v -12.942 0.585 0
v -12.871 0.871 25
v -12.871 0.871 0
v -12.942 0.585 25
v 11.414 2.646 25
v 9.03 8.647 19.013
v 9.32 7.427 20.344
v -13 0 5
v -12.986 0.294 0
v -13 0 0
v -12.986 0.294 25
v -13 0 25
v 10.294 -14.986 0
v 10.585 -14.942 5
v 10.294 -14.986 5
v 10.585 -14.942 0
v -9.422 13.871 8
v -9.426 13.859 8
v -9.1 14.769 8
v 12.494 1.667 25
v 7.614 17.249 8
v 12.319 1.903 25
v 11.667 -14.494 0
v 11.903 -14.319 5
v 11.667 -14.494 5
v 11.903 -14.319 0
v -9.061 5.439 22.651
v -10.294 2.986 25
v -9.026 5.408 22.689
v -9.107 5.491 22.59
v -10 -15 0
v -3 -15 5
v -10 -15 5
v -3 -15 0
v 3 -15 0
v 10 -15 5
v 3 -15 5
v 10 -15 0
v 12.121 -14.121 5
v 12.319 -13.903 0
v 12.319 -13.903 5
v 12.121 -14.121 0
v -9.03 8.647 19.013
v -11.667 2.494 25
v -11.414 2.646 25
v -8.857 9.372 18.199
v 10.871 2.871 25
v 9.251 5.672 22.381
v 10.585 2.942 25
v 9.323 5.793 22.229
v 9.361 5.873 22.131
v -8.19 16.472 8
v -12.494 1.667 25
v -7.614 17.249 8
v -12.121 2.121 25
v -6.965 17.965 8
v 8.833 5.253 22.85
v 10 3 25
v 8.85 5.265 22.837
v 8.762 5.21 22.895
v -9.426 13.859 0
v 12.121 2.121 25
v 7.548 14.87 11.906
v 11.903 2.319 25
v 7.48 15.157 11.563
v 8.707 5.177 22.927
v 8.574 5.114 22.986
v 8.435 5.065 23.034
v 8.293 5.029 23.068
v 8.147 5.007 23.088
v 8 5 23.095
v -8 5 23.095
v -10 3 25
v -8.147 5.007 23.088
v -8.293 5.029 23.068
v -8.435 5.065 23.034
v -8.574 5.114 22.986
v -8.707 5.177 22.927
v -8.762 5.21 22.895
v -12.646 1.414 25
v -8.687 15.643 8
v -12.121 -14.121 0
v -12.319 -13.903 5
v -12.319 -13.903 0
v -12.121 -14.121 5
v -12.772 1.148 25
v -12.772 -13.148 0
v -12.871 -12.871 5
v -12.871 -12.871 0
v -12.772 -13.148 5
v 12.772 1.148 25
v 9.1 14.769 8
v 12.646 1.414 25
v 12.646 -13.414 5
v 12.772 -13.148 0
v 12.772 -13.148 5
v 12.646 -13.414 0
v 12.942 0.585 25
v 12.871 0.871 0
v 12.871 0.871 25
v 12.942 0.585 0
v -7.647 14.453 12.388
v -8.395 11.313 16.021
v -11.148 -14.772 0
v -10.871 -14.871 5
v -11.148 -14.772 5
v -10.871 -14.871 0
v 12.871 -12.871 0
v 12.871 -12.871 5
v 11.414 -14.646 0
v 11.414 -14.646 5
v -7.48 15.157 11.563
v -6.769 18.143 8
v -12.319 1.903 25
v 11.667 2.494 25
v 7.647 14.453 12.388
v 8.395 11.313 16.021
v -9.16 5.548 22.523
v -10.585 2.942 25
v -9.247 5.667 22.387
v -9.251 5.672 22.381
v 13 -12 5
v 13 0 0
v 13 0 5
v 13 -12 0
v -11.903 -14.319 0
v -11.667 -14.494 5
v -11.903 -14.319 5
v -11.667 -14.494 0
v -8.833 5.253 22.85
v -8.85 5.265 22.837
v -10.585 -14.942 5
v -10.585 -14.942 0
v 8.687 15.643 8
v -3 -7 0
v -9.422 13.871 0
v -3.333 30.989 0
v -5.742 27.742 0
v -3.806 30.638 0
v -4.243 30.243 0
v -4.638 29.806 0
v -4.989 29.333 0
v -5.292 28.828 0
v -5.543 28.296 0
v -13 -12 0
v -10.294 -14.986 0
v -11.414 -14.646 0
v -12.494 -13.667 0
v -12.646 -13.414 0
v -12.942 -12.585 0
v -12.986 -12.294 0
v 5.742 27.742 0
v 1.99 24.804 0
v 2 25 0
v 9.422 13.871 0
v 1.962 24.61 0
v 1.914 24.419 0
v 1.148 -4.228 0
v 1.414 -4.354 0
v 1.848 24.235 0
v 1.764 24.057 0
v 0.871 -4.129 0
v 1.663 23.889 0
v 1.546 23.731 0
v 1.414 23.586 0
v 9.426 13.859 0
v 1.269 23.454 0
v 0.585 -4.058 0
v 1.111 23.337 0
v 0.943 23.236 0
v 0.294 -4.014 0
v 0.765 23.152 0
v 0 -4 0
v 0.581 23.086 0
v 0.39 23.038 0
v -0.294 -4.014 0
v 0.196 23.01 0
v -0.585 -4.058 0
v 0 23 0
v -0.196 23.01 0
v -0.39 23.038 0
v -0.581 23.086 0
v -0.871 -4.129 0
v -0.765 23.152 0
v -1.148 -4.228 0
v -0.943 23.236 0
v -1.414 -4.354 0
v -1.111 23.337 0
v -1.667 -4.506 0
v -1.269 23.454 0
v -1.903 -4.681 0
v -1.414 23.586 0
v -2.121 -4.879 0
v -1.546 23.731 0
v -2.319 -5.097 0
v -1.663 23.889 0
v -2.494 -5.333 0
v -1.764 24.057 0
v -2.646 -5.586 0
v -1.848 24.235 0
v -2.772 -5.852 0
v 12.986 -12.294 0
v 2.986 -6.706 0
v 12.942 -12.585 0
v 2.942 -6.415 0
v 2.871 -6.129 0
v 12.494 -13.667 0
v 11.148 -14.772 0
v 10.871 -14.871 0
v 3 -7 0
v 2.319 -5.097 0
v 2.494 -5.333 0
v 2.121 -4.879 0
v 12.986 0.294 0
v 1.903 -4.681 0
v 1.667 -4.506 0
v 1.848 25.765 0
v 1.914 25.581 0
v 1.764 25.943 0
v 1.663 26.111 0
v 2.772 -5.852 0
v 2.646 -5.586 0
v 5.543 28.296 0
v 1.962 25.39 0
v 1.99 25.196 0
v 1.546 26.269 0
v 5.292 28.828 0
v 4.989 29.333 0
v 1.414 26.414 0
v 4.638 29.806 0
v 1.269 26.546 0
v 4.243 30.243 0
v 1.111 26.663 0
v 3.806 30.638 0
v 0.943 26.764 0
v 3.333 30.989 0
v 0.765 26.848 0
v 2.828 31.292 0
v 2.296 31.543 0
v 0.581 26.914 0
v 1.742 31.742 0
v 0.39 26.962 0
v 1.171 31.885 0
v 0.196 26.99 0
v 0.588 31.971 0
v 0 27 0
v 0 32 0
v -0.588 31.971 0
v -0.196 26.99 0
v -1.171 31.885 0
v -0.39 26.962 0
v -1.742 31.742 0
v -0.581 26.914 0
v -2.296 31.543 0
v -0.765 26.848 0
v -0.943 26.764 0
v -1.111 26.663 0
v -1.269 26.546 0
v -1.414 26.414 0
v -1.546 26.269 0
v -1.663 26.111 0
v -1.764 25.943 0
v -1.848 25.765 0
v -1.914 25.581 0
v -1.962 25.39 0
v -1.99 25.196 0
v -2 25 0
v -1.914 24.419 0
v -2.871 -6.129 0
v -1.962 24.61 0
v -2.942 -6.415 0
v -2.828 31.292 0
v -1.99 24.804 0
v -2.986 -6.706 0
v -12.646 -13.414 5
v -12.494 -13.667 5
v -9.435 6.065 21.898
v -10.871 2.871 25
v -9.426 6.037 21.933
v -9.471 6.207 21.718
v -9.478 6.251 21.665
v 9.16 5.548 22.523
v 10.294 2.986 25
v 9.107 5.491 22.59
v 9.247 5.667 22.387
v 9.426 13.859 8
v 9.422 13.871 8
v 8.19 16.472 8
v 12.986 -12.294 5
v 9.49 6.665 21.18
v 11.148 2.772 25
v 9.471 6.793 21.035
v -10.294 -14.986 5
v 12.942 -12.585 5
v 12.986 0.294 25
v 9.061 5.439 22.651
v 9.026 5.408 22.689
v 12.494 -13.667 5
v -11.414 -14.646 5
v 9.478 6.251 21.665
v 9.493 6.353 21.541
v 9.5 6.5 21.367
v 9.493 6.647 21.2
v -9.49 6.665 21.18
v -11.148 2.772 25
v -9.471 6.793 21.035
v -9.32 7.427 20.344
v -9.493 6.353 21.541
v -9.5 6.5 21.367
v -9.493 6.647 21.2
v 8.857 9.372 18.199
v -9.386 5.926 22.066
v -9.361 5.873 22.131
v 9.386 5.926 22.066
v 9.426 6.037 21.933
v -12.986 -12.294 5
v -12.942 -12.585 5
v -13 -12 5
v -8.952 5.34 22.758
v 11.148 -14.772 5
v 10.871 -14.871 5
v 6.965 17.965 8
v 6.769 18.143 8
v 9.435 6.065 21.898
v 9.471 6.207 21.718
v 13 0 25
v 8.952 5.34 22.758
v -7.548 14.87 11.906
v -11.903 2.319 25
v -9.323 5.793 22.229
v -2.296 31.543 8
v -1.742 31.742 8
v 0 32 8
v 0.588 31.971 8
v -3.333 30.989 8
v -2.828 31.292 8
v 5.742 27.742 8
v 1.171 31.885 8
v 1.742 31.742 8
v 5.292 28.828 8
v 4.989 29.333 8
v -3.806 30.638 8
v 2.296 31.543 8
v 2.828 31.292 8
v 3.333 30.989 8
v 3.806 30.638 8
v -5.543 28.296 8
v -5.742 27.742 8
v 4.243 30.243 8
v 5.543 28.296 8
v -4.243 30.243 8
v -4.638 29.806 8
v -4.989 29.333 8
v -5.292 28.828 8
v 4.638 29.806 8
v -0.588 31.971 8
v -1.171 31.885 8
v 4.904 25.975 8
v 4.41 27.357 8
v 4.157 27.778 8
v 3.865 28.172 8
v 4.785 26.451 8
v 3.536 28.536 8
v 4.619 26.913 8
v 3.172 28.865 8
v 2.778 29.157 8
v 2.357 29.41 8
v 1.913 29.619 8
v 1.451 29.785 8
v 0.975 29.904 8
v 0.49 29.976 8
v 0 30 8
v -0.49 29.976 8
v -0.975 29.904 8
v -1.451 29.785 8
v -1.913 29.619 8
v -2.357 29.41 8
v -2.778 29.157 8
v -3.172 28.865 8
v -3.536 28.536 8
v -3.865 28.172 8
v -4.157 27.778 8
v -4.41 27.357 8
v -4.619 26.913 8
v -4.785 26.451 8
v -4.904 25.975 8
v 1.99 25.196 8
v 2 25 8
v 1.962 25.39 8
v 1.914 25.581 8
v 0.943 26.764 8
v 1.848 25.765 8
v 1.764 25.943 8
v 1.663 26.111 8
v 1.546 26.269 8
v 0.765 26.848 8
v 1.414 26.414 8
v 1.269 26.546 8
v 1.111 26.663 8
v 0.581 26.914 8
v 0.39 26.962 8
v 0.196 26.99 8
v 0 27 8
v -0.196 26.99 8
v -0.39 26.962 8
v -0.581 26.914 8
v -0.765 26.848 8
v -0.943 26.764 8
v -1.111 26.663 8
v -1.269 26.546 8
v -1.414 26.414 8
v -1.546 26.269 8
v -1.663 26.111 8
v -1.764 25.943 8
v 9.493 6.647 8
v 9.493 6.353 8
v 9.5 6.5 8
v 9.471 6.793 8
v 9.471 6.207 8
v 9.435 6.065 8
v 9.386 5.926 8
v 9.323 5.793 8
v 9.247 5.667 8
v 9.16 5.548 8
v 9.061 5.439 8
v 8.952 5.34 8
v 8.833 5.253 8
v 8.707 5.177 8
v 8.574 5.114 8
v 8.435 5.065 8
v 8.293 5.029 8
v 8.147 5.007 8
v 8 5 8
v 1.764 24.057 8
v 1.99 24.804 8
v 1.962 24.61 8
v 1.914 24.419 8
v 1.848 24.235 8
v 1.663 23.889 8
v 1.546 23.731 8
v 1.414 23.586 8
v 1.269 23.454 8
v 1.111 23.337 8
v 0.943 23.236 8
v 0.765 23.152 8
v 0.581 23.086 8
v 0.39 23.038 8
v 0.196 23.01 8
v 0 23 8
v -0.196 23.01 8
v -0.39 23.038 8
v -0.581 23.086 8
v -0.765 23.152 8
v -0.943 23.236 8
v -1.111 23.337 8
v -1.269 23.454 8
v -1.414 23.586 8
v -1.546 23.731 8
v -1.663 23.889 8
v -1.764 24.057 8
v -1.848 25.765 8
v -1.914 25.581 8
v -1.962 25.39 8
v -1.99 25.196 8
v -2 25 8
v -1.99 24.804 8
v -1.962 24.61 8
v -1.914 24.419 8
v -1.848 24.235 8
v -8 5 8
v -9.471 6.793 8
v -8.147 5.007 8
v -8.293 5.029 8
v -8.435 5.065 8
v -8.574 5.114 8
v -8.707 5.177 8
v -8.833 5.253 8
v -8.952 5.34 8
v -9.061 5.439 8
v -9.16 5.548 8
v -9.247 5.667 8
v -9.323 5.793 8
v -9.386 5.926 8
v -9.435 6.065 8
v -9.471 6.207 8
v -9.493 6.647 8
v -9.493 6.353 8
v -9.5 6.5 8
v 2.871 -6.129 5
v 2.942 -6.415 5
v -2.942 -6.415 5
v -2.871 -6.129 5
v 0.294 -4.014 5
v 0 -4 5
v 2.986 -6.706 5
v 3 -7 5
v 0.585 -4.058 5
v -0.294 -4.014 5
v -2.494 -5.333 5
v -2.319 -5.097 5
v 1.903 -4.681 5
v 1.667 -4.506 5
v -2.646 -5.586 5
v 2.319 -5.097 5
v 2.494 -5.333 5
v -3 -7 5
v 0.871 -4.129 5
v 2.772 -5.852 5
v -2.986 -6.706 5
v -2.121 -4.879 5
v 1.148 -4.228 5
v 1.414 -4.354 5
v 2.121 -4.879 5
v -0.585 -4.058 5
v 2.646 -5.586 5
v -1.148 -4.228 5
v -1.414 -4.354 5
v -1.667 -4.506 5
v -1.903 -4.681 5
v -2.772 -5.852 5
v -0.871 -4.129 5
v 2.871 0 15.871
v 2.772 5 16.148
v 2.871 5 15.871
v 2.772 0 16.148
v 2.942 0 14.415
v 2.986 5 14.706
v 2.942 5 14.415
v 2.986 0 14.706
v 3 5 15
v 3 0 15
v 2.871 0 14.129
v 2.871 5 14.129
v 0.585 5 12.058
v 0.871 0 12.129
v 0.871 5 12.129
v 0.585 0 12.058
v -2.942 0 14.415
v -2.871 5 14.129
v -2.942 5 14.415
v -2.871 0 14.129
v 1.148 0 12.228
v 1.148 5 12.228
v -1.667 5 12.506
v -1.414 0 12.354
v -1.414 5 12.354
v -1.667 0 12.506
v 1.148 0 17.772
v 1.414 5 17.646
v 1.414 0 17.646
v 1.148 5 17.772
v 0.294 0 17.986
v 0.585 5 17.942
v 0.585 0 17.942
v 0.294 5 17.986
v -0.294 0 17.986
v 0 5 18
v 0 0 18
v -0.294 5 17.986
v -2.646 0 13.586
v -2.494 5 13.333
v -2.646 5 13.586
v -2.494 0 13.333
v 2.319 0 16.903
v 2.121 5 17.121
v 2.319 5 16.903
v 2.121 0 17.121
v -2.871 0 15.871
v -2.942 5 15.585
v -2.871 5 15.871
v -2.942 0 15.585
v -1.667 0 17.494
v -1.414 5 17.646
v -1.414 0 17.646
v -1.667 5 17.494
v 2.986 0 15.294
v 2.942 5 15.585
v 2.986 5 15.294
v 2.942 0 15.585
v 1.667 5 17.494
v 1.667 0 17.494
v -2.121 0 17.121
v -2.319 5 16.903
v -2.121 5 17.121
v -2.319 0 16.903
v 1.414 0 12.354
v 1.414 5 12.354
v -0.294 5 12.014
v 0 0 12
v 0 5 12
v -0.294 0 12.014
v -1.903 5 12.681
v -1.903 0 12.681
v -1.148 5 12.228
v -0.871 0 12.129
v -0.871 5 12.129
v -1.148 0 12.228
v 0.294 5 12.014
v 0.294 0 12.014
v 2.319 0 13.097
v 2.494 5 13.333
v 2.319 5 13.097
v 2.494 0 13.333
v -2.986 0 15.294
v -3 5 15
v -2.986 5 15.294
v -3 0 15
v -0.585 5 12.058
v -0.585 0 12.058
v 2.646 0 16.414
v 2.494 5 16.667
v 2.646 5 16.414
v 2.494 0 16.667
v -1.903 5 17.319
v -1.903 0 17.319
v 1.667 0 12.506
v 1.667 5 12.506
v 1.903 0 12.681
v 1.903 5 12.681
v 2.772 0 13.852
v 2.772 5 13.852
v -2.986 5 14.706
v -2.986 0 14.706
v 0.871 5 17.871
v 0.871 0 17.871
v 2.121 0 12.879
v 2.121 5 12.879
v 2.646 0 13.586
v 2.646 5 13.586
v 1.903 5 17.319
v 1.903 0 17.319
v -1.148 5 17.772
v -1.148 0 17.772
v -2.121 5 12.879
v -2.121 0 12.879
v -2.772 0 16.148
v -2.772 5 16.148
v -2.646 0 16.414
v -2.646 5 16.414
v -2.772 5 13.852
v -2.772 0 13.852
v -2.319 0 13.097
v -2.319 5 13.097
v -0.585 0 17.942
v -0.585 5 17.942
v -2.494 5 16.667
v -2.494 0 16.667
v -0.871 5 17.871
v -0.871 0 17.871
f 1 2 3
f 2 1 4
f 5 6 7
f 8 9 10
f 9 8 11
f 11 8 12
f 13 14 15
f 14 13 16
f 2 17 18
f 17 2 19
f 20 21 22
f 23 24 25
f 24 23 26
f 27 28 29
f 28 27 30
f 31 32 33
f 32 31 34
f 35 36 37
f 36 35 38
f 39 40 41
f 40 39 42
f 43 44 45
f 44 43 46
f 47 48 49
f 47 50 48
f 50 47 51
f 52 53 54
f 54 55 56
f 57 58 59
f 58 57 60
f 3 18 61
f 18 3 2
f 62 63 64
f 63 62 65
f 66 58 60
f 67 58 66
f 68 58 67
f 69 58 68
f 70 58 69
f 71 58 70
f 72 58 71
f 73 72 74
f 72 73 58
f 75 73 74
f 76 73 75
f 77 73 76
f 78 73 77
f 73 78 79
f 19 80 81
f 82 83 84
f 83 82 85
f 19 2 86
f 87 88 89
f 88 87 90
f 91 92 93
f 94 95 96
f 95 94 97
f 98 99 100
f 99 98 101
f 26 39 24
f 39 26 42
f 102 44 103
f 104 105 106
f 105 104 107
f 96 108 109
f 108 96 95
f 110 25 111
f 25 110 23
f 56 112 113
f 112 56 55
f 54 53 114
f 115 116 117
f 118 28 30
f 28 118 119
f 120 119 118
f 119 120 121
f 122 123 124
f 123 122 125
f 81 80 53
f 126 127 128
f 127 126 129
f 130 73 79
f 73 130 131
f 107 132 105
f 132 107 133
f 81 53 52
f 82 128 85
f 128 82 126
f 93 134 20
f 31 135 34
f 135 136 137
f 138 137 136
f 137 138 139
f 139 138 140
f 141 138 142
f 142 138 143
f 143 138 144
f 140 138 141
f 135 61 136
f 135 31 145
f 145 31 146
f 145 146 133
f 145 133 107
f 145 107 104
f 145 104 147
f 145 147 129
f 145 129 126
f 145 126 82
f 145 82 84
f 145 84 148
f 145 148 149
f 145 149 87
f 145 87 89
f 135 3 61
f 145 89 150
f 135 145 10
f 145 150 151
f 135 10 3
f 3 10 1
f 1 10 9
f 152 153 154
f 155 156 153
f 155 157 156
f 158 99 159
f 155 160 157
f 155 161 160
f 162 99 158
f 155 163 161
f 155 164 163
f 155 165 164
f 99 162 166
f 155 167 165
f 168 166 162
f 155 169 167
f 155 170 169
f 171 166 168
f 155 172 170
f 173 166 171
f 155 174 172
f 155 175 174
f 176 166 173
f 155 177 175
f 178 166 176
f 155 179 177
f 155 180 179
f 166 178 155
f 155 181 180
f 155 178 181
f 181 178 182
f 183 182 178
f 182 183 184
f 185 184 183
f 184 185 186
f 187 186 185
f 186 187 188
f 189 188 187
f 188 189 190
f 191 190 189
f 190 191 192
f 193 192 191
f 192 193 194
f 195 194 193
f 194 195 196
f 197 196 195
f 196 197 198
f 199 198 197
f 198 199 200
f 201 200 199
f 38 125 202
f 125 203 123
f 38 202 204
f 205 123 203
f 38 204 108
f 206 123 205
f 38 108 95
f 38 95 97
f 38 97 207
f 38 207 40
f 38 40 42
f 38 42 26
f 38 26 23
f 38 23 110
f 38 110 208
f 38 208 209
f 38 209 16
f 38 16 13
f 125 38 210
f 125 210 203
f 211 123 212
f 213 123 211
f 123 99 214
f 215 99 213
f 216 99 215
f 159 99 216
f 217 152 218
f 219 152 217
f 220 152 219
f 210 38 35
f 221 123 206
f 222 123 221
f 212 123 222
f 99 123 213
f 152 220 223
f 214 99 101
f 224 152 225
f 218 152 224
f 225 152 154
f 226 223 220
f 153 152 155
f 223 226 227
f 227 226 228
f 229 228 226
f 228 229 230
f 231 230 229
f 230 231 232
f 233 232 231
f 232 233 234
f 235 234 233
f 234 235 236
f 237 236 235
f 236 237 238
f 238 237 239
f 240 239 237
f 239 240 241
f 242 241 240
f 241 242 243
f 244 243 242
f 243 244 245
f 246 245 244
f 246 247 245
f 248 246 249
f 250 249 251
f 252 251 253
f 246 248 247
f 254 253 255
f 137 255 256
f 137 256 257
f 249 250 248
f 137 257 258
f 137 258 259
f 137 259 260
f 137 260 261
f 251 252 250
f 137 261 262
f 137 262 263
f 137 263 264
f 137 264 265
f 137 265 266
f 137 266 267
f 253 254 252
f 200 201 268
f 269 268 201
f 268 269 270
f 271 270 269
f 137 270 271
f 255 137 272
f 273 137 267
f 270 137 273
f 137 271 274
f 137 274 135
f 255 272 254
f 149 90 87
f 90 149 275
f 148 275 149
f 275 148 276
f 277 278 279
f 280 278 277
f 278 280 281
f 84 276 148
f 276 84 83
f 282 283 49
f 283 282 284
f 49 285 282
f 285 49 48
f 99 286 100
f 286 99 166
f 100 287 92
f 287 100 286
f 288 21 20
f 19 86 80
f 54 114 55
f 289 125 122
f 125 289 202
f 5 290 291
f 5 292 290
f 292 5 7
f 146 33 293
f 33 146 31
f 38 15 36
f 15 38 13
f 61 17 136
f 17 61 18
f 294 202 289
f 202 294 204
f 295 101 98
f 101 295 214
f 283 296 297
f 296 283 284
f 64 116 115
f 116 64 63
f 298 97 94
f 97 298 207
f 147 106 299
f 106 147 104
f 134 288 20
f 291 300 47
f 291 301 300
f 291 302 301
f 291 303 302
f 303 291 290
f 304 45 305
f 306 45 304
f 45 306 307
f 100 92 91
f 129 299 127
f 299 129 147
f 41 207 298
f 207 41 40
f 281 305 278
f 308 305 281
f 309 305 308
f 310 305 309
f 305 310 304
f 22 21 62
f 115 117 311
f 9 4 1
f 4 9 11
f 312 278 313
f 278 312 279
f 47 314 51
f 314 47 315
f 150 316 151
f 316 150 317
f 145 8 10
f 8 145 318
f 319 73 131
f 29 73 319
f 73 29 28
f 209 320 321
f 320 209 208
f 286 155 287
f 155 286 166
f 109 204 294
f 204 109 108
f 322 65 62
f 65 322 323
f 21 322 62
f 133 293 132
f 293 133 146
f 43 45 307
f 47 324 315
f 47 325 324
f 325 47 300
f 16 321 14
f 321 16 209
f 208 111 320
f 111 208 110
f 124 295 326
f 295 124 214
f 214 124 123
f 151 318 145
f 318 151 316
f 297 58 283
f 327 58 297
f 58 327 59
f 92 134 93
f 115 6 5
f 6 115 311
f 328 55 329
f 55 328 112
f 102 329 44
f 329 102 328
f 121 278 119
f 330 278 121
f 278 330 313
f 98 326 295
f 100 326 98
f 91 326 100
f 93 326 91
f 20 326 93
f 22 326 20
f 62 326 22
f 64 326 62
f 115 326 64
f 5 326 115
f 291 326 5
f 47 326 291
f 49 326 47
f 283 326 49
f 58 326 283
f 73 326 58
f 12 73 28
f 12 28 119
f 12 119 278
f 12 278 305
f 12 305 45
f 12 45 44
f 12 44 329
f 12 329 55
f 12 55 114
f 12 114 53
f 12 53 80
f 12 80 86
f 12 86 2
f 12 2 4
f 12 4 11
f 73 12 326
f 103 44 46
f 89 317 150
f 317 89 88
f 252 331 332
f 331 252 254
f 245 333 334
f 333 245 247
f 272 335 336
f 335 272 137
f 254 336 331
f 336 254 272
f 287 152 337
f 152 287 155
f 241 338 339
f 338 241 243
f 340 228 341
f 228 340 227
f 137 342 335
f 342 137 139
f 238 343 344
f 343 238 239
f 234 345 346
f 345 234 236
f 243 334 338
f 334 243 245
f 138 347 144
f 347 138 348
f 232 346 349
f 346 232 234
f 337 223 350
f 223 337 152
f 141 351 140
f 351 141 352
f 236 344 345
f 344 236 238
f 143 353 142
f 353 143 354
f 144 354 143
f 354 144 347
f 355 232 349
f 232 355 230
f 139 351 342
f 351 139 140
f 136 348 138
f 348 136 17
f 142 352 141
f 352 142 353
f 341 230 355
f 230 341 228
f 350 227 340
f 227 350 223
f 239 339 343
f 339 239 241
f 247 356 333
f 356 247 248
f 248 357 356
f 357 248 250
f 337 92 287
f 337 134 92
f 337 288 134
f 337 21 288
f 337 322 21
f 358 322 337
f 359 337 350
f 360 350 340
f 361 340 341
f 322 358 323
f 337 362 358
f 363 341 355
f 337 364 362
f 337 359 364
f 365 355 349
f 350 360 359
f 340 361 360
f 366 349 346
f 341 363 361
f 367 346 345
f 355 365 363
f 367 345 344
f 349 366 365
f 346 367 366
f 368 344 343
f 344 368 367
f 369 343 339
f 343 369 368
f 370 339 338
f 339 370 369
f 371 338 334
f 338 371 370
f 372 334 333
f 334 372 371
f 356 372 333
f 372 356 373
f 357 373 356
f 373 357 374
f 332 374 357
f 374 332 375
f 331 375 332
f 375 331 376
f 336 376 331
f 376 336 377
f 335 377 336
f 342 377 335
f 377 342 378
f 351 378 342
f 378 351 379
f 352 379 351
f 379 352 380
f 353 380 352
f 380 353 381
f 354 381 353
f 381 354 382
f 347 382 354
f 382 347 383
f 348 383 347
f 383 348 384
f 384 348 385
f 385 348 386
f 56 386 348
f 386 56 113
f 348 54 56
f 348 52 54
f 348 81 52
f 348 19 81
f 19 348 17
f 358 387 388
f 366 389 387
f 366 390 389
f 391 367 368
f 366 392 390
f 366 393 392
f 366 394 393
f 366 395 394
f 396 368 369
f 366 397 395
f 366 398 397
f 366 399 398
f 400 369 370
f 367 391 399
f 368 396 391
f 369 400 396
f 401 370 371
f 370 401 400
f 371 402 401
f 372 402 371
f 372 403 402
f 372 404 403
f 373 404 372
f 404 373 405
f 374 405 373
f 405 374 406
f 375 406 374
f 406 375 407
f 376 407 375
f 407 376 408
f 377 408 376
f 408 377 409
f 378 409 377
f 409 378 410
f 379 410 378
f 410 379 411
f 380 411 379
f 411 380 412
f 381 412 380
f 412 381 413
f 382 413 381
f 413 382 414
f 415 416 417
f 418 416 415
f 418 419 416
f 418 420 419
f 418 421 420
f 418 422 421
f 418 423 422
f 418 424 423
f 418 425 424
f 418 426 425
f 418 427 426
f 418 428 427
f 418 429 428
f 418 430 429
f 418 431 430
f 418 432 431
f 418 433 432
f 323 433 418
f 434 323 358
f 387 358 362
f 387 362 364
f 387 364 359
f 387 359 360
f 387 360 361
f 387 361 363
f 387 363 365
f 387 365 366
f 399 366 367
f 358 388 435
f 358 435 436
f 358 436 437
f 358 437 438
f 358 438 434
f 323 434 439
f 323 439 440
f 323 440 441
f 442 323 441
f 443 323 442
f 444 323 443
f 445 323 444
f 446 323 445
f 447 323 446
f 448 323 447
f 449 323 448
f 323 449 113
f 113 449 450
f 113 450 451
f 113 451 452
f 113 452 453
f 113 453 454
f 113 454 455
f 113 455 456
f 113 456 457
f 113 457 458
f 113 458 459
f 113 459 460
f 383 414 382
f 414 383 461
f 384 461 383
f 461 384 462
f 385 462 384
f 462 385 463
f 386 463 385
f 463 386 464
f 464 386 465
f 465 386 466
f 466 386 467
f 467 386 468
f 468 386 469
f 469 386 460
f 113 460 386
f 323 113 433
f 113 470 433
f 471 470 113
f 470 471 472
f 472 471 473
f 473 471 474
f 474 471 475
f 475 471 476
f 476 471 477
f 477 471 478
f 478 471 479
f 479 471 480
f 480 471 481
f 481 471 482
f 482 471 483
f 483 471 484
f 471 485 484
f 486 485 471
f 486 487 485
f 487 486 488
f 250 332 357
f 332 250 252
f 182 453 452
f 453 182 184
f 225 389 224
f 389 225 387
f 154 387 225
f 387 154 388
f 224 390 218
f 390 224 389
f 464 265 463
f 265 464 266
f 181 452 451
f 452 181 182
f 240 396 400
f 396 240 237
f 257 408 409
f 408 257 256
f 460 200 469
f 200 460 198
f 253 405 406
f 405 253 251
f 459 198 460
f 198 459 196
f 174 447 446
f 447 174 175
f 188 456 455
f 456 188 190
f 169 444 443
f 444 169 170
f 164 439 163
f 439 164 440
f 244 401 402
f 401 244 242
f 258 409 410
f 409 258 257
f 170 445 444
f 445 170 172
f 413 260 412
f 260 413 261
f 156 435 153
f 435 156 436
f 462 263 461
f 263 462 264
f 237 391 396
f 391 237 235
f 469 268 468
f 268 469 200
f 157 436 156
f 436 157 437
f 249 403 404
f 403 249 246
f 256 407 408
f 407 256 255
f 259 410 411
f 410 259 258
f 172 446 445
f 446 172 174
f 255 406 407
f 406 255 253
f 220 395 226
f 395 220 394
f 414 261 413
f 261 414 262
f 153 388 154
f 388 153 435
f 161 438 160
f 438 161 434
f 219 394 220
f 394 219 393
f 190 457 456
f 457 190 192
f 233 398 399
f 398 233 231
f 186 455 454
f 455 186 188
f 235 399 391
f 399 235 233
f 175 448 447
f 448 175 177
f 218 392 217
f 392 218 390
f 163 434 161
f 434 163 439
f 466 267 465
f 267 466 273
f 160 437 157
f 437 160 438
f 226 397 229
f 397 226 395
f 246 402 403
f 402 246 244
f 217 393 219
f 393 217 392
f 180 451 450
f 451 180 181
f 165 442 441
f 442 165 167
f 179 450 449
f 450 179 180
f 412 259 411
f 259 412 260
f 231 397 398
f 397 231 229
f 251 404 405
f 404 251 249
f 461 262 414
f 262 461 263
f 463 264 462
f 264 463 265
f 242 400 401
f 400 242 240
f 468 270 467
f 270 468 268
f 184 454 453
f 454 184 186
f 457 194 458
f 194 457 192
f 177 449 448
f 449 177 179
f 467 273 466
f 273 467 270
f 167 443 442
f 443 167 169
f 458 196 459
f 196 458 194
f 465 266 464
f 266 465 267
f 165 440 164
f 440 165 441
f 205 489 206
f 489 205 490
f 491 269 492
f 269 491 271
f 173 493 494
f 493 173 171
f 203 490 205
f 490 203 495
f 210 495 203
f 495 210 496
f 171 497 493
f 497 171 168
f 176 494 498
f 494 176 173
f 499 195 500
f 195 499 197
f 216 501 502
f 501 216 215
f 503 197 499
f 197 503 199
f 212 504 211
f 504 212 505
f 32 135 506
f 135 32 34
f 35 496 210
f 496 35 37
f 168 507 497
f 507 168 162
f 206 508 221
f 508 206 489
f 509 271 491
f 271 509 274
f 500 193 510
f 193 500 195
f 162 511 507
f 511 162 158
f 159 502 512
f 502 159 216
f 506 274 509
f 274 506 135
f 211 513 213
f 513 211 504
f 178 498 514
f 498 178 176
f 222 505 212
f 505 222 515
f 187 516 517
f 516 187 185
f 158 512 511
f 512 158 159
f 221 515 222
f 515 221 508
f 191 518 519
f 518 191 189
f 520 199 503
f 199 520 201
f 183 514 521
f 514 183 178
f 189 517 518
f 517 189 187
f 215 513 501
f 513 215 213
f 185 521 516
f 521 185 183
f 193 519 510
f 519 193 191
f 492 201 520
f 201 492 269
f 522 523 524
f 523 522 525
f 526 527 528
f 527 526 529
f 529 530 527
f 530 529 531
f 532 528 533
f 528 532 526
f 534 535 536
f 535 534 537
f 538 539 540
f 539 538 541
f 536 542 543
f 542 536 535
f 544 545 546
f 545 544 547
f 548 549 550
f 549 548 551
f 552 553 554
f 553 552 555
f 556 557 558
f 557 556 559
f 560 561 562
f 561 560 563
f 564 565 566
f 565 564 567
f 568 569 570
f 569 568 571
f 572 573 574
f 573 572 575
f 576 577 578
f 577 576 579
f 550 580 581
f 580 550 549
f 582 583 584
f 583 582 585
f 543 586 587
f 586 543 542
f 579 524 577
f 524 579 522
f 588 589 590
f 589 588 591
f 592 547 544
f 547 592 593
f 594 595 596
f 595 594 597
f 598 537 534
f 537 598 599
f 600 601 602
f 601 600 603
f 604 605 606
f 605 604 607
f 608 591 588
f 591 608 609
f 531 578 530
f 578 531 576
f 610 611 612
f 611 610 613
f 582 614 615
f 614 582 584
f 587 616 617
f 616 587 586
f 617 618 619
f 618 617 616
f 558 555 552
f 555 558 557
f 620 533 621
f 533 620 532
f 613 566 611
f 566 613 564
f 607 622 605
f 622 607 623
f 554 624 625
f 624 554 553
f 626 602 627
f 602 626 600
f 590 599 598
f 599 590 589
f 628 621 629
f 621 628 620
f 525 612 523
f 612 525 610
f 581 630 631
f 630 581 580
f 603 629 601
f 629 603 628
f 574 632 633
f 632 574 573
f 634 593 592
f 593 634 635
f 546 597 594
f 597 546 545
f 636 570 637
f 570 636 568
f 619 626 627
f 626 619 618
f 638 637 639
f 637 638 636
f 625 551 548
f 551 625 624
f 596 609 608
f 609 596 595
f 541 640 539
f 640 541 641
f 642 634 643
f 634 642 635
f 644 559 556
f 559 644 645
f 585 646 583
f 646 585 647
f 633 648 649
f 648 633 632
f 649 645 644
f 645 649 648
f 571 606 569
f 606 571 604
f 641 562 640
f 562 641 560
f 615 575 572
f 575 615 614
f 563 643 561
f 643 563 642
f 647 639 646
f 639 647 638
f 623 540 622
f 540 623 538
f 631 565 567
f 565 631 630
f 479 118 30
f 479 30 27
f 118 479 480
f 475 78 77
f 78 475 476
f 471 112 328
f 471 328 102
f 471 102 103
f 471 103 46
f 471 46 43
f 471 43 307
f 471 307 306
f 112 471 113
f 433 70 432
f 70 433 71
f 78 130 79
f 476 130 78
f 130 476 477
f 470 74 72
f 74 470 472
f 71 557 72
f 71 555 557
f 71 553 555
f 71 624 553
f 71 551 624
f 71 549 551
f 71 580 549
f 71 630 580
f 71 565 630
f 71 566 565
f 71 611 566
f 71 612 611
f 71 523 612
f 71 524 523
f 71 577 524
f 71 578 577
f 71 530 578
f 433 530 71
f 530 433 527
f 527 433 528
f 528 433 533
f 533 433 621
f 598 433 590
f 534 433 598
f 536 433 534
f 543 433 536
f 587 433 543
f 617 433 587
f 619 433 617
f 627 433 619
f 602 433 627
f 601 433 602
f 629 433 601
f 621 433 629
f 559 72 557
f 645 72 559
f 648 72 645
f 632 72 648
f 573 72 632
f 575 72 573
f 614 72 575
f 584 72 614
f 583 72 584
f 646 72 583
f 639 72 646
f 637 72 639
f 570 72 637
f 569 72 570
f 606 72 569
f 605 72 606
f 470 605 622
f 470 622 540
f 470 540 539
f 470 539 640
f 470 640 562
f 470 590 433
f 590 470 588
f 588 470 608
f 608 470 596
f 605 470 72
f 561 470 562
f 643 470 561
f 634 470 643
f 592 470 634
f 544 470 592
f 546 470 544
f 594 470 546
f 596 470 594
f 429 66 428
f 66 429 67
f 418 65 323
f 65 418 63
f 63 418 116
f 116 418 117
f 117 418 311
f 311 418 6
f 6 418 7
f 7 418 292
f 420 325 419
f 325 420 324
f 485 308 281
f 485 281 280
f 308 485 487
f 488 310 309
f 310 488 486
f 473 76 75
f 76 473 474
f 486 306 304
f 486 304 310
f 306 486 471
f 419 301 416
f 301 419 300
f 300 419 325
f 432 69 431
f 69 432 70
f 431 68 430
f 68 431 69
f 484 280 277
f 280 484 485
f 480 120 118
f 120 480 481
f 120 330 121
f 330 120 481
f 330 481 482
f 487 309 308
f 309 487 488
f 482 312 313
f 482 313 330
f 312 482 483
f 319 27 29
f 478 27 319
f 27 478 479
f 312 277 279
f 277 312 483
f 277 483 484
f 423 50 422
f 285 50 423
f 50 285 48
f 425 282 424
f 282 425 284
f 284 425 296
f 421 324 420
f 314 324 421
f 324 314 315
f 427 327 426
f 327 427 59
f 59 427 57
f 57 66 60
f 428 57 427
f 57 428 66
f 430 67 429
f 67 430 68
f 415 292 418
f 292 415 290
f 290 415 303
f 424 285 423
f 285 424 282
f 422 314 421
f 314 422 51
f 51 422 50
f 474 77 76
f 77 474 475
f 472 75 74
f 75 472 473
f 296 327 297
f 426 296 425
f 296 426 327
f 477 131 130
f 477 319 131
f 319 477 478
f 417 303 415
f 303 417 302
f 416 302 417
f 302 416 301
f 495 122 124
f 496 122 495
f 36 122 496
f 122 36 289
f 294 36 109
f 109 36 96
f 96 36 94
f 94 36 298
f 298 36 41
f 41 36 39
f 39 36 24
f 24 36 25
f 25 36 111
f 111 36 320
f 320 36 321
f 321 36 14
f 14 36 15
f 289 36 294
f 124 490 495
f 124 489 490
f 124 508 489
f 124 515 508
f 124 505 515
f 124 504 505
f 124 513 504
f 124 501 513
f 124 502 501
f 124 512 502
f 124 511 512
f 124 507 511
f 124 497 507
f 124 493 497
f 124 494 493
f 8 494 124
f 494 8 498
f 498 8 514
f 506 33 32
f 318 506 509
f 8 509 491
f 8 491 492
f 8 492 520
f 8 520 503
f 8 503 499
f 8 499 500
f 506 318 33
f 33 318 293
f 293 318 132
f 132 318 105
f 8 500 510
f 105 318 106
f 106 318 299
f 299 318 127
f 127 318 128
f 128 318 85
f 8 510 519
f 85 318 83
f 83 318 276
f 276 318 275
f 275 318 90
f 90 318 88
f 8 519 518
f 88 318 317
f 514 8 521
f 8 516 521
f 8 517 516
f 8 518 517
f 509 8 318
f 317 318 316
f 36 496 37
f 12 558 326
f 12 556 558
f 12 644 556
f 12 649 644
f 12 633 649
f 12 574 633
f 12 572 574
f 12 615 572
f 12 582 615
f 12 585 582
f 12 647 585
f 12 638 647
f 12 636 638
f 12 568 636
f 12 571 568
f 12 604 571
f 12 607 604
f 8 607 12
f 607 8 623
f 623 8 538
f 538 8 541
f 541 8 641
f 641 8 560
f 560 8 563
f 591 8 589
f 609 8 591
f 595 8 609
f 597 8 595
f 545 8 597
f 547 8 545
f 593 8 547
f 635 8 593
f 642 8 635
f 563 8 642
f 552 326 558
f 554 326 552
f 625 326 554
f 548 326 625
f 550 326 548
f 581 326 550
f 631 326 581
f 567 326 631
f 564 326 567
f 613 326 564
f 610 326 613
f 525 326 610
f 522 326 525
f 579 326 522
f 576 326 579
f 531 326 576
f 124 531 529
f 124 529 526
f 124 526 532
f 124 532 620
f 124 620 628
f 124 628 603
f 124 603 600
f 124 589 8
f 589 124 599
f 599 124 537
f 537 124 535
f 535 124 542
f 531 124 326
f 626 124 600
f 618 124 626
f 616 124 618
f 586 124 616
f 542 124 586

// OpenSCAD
// bed_bracket

//40 = 55, 25
// 6mm dziury
$fn=64;

module bed_bracket_55() {
   difference() {
      union() {
         hull() {
            translate([-10,-12,0]) cylinder(d=6,h=25,center=false);
            translate([10,-12,0]) cylinder(d=6,h=25,center=false);
            translate([-10,0,0]) cylinder(d=6,h=25,center=false);
            translate([10,0,0]) cylinder(d=6,h=25,center=false);
            translate([0,55+7-12/2-15,0]) cylinder(d=15.71,h=8,center=false);
         }
         hull() {
            translate([-10,0,0]) cylinder(d=6,h=8,center=false);
            translate([10,0,0]) cylinder(d=6,h=8,center=false);
            translate([0,55+7-12/2,0]) cylinder(d=12,h=8,center=false);
         }
      }
      translate([0,55,-1]) cylinder(d=4,h=30,center=false);
      hull() {
         translate([0,-7,-1]) cylinder(d=6,h=30,center=false);
         translate([0,-17,-1]) cylinder(d=6,h=30,center=false);
      }

      translate([0,-1,15]) rotate([-90,0,0]) cylinder(d=6,h=30,center=false);
      hull() {
         translate([-8,6.5,8]) cylinder(d=3,h=25,center=false);
         translate([8,6.5,8]) cylinder(d=3,h=25,center=false);
         translate([0,45,8]) cylinder(d=10,h=8,center=false);
      }
      translate([0,-15,20]) cube([30,30,30],true);
   }
}

module bed_bracket_25() {
   difference() {
      union() {
         hull() {
            translate([-10,-12,0]) cylinder(d=6,h=25,center=false);
            translate([10,-12,0]) cylinder(d=6,h=25,center=false);
            translate([-10,0,0]) cylinder(d=6,h=25,center=false);
            translate([10,0,0]) cylinder(d=6,h=25,center=false);
            translate([0,25+7-12/2-15,0]) cylinder(d=19.7,h=8,center=false);
         }
         hull() {
            translate([-10,0,0]) cylinder(d=6,h=8,center=false);
            translate([10,0,0]) cylinder(d=6,h=8,center=false);
            translate([0,25+7-12/2,0]) cylinder(d=12,h=8,center=false);
         }
      }
      translate([0,25,-1]) cylinder(d=4,h=30,center=false);
      hull() {
         translate([0,-7,-1]) cylinder(d=6,h=30,center=false);
         translate([0,-17,-1]) cylinder(d=6,h=30,center=false);
      }

      translate([0,-1,15]) rotate([-90,0,0]) cylinder(d=6,h=30,center=false);
      hull() {
         translate([-8,6.5,8]) cylinder(d=3,h=25,center=false);
         translate([8,6.5,8]) cylinder(d=3,h=25,center=false);
         translate([0,25,8]) cylinder(d=10,h=8,center=false);
      }
      translate([0,-15,20]) cube([30,30,30],true);
   }
}

bed_bracket_25();
//bed_bracket_55();
